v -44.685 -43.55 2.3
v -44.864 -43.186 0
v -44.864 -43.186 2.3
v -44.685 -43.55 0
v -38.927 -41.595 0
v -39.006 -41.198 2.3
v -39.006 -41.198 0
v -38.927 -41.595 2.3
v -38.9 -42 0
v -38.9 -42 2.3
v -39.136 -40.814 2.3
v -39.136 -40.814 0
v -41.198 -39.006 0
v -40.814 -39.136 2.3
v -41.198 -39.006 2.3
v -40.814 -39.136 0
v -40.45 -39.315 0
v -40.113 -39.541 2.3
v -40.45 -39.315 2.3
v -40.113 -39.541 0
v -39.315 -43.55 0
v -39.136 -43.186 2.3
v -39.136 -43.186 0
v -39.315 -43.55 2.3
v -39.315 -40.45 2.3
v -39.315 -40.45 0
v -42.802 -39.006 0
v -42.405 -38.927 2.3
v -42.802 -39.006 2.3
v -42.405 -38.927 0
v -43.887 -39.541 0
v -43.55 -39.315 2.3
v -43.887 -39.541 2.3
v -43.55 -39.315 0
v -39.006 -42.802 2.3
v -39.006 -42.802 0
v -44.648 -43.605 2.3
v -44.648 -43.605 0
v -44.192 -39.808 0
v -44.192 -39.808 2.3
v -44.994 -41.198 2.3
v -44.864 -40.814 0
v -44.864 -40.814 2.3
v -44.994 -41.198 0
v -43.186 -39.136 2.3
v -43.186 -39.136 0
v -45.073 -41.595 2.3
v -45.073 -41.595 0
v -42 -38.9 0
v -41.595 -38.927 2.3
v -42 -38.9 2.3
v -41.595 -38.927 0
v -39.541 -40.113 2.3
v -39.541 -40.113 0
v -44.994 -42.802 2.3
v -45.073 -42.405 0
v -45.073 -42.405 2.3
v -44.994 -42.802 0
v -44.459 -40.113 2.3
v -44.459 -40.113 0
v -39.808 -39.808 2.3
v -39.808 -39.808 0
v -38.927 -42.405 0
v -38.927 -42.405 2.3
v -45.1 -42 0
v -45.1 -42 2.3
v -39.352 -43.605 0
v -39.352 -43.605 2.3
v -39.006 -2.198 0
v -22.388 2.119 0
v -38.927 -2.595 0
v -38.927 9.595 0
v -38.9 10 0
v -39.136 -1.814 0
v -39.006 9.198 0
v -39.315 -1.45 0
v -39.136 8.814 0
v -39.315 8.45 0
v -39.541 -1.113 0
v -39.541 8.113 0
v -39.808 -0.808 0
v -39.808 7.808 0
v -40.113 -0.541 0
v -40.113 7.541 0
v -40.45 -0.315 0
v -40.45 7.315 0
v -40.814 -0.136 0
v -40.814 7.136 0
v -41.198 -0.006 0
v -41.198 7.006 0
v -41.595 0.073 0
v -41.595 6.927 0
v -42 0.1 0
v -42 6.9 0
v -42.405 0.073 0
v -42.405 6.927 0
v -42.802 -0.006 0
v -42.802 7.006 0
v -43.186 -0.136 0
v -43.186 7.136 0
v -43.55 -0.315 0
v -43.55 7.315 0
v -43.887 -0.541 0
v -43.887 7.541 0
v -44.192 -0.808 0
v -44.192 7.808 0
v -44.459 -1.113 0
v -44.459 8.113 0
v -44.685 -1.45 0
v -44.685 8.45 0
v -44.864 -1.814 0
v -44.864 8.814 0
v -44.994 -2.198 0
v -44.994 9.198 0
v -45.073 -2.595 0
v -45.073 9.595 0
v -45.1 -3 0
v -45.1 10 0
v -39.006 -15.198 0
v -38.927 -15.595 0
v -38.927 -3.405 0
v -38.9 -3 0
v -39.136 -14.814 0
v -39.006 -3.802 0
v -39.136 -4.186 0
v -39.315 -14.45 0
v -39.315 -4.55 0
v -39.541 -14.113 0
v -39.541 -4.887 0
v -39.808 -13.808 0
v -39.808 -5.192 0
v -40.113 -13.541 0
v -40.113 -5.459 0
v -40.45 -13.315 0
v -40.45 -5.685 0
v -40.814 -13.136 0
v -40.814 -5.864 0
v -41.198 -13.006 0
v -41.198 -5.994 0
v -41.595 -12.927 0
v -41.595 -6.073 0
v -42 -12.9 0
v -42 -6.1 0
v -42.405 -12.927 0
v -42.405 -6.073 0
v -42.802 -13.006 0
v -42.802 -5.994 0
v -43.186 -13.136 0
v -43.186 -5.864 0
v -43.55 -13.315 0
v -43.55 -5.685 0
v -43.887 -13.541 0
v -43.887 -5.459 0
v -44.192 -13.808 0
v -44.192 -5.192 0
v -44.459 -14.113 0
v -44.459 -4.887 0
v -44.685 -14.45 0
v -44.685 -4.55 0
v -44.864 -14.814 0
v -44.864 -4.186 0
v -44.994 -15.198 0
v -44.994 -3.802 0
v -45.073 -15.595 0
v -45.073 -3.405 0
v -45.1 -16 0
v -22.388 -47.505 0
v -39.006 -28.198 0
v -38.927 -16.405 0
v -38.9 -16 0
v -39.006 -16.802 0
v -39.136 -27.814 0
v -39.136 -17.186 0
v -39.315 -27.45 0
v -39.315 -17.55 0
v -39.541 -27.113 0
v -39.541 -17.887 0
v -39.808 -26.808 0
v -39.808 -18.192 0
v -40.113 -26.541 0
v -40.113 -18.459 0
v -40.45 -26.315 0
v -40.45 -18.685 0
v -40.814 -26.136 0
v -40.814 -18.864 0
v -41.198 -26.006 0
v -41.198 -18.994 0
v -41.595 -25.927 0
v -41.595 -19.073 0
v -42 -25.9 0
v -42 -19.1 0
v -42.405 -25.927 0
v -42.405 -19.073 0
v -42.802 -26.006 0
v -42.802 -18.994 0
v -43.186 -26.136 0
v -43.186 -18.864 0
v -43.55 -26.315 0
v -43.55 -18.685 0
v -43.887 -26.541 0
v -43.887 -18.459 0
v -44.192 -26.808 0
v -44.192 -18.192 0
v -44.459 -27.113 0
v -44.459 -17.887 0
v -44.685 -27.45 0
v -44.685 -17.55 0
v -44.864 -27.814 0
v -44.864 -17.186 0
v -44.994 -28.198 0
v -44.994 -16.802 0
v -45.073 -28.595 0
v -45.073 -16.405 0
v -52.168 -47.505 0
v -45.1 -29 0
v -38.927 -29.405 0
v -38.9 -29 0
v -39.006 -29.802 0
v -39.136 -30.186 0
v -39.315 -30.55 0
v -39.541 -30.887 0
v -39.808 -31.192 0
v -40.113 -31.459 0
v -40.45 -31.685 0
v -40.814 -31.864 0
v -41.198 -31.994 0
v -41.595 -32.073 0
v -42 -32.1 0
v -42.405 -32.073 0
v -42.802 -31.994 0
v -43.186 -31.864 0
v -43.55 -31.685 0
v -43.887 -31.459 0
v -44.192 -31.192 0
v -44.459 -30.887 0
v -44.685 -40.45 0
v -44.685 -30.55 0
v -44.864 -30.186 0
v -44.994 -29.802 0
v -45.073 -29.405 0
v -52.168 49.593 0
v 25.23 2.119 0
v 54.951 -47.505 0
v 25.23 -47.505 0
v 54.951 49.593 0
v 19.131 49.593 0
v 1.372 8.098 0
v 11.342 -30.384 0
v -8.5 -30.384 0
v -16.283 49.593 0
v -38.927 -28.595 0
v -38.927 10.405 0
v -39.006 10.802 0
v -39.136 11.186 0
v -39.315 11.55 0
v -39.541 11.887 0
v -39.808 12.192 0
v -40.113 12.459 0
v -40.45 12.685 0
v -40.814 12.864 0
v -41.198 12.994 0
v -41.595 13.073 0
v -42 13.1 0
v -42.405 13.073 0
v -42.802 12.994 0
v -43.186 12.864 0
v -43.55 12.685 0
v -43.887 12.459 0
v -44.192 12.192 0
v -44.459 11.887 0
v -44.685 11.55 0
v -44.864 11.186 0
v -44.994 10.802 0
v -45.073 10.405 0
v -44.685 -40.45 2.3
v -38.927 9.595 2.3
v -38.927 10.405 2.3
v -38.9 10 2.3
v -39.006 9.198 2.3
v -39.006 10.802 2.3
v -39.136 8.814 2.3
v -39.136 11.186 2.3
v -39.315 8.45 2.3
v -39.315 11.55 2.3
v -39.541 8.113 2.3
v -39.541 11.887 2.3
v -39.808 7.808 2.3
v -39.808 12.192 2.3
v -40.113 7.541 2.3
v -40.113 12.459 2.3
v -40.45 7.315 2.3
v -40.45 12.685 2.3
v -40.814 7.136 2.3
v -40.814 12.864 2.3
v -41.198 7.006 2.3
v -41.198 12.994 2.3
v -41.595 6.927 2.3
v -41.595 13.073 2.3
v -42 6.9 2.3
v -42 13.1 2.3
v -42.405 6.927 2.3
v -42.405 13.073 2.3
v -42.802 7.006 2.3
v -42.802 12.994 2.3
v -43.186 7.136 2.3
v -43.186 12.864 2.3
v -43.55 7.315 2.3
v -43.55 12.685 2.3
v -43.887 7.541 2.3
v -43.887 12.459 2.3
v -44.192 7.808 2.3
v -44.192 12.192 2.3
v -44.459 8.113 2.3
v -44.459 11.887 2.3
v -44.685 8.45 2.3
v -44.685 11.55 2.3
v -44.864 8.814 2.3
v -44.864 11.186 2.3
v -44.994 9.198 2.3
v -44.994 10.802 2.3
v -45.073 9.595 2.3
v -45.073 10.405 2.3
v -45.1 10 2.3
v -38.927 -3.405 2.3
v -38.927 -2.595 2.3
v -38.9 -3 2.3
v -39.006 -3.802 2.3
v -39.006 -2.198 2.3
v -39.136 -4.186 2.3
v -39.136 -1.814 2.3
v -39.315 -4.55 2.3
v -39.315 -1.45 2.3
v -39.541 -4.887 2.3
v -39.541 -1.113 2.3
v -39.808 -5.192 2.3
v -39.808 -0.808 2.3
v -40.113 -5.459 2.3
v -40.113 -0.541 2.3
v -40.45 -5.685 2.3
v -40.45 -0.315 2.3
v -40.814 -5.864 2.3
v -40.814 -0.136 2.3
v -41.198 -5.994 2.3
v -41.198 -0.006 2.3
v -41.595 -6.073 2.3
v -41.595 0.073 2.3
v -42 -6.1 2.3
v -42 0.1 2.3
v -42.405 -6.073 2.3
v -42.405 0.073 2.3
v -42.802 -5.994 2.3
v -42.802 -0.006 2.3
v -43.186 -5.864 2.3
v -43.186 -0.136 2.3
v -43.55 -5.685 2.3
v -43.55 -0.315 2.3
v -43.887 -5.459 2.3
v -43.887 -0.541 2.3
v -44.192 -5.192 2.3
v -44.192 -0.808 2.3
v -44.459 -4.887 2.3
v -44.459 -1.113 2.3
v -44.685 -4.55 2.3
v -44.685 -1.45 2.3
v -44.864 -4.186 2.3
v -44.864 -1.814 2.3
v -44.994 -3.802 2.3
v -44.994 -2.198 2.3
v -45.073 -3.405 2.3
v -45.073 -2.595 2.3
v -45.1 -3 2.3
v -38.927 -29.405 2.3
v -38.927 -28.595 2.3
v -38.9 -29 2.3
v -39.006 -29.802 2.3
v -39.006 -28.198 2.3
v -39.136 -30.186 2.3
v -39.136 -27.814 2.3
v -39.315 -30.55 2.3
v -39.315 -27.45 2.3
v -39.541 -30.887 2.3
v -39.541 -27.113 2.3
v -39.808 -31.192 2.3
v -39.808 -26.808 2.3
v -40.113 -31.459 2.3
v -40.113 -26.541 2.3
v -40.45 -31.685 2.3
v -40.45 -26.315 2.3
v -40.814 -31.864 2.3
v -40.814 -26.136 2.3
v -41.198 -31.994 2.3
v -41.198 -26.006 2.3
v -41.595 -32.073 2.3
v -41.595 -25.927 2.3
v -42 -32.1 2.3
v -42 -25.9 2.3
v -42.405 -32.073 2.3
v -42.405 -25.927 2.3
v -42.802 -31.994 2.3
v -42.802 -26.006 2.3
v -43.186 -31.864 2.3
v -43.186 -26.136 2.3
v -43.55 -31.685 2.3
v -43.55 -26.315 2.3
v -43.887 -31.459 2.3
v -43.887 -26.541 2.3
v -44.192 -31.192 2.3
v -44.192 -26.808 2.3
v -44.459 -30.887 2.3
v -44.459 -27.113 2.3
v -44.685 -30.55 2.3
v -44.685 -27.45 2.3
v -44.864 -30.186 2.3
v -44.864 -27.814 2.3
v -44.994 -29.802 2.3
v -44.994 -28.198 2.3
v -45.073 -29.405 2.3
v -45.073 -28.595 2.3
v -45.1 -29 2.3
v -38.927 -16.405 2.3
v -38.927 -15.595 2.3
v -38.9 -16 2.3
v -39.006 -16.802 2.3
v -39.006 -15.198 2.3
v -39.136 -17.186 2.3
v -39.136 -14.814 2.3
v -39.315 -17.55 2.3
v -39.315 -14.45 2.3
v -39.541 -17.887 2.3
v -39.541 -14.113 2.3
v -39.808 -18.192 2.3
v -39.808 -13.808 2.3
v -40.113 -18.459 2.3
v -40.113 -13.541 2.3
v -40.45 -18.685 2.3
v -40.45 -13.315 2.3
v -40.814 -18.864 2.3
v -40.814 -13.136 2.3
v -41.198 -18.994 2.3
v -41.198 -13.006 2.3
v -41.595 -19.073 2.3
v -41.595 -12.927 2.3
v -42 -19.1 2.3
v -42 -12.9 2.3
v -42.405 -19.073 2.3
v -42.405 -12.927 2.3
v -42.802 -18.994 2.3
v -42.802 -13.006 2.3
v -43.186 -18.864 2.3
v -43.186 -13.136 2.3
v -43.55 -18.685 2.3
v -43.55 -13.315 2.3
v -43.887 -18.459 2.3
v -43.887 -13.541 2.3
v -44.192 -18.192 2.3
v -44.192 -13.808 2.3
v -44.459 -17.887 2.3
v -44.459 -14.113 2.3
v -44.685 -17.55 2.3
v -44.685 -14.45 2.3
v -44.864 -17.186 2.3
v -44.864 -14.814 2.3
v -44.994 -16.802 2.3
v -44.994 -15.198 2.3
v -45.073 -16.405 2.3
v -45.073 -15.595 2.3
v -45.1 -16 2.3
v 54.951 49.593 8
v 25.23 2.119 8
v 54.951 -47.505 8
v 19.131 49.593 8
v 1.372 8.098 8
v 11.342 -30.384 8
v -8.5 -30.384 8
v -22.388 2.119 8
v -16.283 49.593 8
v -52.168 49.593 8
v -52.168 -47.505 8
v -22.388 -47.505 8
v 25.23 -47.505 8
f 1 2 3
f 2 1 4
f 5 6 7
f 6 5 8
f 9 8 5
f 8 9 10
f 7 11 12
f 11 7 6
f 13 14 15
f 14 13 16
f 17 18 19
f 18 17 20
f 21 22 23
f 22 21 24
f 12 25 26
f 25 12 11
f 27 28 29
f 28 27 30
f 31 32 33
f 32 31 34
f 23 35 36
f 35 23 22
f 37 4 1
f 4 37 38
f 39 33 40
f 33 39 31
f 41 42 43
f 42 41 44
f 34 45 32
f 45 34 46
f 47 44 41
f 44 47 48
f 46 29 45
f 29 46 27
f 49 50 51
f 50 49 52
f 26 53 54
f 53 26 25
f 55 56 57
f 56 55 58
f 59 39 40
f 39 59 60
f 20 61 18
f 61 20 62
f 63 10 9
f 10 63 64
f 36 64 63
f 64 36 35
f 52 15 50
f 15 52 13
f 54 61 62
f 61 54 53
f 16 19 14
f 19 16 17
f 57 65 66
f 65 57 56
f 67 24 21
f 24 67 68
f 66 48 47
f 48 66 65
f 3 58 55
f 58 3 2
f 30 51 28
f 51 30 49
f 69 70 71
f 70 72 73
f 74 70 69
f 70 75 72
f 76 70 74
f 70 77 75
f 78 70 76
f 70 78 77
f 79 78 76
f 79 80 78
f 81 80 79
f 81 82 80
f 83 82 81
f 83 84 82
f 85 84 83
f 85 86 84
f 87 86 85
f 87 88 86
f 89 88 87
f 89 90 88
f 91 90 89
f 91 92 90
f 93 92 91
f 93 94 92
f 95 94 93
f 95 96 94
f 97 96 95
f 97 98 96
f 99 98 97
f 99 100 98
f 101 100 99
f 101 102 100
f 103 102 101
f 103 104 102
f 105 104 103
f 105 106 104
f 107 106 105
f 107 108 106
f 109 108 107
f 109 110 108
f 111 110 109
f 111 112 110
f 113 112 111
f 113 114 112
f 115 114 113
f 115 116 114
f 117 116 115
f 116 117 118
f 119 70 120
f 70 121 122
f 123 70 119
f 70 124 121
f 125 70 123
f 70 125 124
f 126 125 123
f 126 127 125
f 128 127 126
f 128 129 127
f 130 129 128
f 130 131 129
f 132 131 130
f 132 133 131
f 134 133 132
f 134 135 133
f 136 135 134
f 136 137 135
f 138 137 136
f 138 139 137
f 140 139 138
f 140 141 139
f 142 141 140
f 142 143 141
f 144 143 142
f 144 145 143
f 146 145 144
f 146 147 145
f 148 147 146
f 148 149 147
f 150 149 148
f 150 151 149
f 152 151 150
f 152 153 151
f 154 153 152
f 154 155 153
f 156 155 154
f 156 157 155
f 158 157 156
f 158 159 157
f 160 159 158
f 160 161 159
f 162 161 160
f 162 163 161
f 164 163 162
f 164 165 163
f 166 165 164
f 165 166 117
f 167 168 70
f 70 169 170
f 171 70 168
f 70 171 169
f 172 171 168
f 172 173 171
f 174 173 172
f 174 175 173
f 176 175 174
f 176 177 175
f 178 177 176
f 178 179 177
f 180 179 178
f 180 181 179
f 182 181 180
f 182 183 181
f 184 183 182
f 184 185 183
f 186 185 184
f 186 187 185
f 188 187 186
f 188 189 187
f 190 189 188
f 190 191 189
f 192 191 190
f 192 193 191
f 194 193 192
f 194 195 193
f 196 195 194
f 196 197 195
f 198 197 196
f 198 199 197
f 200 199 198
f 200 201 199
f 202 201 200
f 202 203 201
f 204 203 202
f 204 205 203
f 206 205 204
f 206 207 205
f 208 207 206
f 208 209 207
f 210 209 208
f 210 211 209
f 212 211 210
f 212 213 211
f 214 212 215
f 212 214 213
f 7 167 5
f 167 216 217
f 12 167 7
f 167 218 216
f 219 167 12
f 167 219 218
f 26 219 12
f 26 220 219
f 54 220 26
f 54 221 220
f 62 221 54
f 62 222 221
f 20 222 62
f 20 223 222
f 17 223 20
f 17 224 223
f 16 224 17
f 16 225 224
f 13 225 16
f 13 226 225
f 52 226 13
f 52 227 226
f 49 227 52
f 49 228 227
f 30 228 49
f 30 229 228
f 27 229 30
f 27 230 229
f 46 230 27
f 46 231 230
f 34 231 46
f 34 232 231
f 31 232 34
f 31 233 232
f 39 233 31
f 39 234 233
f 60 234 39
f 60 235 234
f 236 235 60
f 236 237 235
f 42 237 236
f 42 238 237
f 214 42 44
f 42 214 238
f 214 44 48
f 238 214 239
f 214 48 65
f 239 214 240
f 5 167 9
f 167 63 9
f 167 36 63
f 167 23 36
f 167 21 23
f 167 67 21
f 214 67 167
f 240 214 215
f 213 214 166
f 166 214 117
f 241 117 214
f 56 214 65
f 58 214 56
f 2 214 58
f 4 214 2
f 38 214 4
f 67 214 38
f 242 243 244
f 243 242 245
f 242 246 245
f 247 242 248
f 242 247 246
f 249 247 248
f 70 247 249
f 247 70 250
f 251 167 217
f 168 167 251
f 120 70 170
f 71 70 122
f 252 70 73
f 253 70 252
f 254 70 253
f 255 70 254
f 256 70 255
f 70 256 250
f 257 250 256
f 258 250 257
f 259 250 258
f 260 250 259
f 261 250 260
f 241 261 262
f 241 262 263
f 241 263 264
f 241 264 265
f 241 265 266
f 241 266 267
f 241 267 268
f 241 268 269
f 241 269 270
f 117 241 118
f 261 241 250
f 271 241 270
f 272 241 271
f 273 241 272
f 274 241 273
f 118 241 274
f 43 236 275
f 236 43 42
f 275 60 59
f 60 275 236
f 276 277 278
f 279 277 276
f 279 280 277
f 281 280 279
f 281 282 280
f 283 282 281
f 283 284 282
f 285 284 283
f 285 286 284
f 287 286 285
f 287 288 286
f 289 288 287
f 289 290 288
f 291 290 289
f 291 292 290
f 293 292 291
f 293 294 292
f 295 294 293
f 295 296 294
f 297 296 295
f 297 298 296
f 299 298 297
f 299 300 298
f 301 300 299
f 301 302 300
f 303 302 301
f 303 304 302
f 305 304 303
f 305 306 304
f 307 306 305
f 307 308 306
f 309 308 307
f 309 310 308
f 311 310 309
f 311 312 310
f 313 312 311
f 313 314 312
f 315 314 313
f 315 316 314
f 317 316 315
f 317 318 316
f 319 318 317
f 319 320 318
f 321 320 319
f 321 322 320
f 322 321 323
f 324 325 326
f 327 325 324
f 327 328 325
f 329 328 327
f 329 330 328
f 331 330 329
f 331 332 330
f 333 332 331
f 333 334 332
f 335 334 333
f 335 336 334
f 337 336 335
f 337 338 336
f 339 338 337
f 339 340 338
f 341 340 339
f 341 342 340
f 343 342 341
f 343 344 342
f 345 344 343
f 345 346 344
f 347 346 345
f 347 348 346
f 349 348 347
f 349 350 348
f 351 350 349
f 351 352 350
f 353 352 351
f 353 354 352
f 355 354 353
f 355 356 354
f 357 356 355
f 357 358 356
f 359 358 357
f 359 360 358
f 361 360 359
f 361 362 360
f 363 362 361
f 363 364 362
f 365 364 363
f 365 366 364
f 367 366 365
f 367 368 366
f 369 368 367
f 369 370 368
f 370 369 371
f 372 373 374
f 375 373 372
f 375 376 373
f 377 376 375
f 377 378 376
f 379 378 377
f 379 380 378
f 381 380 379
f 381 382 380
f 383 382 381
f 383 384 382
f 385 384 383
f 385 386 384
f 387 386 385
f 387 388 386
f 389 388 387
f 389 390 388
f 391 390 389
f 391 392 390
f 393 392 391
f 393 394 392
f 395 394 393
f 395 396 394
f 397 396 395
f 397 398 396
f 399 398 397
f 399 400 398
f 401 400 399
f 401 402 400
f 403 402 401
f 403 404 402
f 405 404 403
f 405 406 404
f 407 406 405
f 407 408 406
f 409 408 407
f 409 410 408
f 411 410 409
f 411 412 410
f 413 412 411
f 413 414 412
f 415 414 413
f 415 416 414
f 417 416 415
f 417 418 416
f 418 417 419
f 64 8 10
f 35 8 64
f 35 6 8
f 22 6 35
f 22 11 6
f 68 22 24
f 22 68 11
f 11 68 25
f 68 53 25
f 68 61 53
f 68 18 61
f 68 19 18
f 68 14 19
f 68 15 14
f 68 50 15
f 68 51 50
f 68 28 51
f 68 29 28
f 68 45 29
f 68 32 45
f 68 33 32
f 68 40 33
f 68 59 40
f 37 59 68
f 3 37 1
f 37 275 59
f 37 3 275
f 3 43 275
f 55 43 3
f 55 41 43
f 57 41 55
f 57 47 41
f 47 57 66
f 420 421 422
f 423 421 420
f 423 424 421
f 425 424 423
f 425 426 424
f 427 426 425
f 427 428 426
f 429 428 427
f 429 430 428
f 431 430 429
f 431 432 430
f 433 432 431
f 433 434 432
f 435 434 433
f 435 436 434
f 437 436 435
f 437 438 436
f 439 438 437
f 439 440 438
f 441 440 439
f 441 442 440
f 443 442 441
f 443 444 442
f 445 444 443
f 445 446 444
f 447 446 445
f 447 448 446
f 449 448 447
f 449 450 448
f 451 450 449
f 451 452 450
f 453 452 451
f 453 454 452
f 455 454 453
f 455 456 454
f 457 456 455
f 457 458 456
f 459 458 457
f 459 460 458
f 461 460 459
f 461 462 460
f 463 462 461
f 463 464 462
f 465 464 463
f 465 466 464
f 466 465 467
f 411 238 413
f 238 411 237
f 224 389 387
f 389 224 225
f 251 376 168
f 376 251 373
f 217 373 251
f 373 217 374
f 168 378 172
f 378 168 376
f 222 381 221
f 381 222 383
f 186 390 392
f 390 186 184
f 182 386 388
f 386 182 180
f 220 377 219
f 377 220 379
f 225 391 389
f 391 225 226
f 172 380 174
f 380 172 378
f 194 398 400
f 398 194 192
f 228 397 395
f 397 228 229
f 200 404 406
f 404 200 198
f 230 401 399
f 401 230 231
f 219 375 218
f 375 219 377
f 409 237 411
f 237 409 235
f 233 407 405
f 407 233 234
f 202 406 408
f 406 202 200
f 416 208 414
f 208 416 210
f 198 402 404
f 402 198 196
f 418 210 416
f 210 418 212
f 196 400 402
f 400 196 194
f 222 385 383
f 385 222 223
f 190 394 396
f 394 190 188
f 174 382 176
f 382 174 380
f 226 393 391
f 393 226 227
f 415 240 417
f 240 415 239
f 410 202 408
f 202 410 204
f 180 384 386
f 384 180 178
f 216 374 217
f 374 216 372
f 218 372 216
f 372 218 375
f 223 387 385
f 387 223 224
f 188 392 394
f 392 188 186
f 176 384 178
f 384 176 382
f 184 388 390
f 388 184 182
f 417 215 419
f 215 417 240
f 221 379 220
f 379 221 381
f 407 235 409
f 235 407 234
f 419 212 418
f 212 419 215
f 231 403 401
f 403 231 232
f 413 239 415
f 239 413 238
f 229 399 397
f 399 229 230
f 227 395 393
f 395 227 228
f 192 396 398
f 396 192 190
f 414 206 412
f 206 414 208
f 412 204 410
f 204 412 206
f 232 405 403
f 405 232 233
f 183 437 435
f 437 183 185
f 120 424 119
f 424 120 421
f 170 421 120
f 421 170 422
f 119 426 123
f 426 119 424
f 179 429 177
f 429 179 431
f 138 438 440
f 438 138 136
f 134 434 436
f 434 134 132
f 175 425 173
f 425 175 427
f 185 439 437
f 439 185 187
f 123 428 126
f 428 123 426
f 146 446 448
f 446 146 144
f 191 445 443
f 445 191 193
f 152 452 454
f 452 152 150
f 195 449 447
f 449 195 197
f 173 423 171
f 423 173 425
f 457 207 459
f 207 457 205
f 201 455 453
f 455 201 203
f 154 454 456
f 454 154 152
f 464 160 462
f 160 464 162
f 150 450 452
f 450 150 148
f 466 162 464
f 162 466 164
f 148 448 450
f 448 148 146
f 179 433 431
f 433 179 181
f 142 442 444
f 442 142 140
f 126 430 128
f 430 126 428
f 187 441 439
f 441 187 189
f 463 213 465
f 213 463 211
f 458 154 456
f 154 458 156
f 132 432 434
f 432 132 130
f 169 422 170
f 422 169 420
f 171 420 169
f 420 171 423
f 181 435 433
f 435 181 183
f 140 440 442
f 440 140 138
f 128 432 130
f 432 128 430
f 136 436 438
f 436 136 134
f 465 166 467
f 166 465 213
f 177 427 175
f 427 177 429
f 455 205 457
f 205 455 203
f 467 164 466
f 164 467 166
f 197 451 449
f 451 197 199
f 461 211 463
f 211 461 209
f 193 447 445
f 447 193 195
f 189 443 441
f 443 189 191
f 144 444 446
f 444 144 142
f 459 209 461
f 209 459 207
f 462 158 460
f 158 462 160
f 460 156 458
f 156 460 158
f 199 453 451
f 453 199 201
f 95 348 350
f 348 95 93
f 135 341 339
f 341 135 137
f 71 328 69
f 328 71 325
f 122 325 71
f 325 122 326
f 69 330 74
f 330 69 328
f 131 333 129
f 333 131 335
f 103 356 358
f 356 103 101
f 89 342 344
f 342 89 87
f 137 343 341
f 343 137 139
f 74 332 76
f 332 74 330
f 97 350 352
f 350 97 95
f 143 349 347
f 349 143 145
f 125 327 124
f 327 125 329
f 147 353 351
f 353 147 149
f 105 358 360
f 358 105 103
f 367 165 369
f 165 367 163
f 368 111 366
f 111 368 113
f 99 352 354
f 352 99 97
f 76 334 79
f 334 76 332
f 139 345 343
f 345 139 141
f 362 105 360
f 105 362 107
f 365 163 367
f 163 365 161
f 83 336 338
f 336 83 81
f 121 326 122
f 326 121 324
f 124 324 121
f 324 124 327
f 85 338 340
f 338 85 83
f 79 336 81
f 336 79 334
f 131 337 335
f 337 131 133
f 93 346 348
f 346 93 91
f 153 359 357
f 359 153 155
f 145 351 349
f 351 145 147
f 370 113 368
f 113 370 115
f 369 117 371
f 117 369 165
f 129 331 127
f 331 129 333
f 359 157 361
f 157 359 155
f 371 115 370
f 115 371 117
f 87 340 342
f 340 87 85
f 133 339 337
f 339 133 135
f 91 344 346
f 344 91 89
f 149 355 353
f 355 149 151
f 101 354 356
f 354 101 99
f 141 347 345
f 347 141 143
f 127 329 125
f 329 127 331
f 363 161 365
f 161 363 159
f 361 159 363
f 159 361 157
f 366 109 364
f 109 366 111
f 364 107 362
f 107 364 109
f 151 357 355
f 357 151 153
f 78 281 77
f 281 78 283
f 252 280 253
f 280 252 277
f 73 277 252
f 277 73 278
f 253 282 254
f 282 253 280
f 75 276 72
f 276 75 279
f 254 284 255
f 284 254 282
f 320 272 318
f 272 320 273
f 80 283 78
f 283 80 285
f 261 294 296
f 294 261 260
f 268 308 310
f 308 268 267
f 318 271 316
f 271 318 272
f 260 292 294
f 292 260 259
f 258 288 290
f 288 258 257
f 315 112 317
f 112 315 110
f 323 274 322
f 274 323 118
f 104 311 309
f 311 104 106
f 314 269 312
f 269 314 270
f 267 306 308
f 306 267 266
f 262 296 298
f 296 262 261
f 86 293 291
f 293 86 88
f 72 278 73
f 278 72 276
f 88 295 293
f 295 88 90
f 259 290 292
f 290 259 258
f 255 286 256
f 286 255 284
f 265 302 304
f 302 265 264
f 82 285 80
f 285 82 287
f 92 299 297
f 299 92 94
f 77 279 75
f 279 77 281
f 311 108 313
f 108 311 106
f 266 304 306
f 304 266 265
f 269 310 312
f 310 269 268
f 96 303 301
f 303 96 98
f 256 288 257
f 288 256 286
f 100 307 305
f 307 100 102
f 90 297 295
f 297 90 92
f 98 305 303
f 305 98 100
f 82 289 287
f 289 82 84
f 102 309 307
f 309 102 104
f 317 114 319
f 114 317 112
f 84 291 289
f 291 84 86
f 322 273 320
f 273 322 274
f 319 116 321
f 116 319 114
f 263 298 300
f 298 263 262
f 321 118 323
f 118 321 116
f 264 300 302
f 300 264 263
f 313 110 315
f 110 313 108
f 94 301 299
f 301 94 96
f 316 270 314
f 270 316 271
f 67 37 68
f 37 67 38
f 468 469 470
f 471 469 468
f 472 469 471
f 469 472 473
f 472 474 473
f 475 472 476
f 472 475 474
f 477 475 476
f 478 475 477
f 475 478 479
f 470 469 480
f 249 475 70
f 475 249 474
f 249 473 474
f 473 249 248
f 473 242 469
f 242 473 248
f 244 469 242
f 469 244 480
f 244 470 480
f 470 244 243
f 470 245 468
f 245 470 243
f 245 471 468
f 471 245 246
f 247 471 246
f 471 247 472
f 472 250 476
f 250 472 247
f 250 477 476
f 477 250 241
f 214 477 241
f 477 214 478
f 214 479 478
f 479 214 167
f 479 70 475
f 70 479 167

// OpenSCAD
letter = "M";
font_name = "Bahnschrift:style=Bold";
letter_size = 88;
letter_thickness = 8;
shape_mode = "tile";
tile_margin = 4;
magnet_d = 6.2;
magnet_depth = 2.3;
edge_clearance = 0.8;
max_magnets = 5;
magnet_mode = "auto_grid";
manual_positions = [[-18, 16], [16, -16], [0, 0]];
grid_pitch = 13;
grid_extent = 42;
$fn = 48;
module glyph_2d() { text(letter, size = letter_size, font = font_name, halign = "center", valign = "center"); }
module printable_shape_2d() { if (shape_mode == "tile") offset(delta = tile_margin) glyph_2d(); else glyph_2d(); }
module safe_mask_2d() { offset(r = -(magnet_d / 2 + edge_clearance)) printable_shape_2d(); }
function grid_candidates(extent, pitch) = [for (x = [-extent:pitch:extent]) for (y = [-extent:pitch:extent]) [x, y]];
module pocket_candidates() { pts = magnet_mode == "manual" ? manual_positions : grid_candidates(grid_extent, grid_pitch); for (i = [0:min(max_magnets, len(pts)) - 1]) { p = pts[i]; translate([p[0], p[1], 0]) cylinder(h = magnet_depth, d = magnet_d); } }
difference() { linear_extrude(height = letter_thickness) printable_shape_2d(); intersection() { linear_extrude(height = magnet_depth) safe_mask_2d(); pocket_candidates(); } }
